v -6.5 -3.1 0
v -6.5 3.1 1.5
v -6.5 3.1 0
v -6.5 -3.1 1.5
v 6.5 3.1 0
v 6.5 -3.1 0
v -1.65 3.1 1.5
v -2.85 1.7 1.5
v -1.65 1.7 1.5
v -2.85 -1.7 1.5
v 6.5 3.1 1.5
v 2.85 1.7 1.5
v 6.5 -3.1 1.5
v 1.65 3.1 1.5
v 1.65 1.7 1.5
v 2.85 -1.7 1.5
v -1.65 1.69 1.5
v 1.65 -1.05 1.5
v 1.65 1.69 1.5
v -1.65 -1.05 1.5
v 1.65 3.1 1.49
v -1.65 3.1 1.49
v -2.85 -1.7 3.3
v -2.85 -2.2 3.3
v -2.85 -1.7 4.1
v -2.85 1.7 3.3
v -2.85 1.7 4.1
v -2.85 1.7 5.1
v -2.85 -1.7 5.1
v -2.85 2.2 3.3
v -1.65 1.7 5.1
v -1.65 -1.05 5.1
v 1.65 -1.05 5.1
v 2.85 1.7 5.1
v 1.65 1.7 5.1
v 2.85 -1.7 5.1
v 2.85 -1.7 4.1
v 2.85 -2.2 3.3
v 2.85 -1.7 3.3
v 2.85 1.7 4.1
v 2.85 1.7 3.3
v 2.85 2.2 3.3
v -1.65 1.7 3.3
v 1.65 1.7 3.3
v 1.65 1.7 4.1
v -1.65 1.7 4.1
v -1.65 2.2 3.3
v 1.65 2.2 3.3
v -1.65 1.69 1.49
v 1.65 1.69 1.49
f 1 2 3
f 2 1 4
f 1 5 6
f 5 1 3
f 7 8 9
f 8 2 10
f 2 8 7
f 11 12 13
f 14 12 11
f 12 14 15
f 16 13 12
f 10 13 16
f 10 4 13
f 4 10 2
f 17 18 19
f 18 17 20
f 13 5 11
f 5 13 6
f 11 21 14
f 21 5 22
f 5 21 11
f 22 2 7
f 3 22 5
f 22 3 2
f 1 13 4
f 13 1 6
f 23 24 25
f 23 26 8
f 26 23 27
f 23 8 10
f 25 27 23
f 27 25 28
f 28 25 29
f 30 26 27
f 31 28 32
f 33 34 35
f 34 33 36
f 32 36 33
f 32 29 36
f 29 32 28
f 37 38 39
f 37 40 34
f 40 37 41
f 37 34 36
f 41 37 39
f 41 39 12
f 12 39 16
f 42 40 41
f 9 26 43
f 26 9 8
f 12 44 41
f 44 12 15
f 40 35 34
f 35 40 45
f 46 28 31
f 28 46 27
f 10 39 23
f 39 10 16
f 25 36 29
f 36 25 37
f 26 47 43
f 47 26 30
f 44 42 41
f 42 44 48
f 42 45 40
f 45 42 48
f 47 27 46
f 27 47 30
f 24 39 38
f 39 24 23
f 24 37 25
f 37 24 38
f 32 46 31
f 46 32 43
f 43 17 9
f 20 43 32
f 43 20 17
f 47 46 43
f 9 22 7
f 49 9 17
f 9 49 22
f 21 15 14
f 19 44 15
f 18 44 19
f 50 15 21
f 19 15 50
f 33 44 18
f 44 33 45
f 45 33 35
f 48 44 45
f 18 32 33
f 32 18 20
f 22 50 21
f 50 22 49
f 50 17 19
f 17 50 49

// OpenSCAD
// ============================================================
// ПОЛЗУНОК ПЕРЕКЛЮЧАТЕЛЯ
// ============================================================

wall_t   = 1.7;
hole_l   = 8.0;
hole_w   = 3.7;
switch_h = 2.0;

pin_w = 1.8;
pin_l = 3.3;

tolerance = 0.15;


// ============================================================
// РАЗМЕРЫ
// ============================================================

leg_l = hole_l - switch_h - tolerance * 2;
leg_w = hole_w - tolerance * 2;
leg_h = wall_t + 0.9;

cap_l = hole_l + 5.0;
cap_w = hole_w + 2.5;
cap_h = 1.5;

tooth_out = 0.5;
tooth_h   = 0.8;


// ============================================================
translate([0, 0, leg_h + cap_h])
    rotate([0, 180, 0])
        main_slider();


// ============================================================

module main_slider()
{
    difference()
    {
        union()
        {
            // ------------------------------------------------
            // ШЛЯПКА
            // ------------------------------------------------

            translate([
                -cap_l/2,
                -cap_w/2,
                leg_h
            ])
                cube([
                    cap_l,
                    cap_w,
                    cap_h
                ]);


            // ------------------------------------------------
            // ОСНОВНАЯ НОЖКА
            // ------------------------------------------------

            translate([
                -leg_l/2,
                -leg_w/2,
                -1
            ])
                cube([
                    leg_l,
                    leg_w,
                    leg_h + 1
                ]);


            // ------------------------------------------------
            // НАРУЖНЫЕ ЗУБЬЯ СО СКОСОМ
            // ------------------------------------------------

            translate([
                -leg_l/2,
                leg_w/2,
                0
            ])
                translate([leg_l/2, tooth_out/2, tooth_h/2])
                    rotate([0, 180, 0])
                        translate([-leg_l/2, -tooth_out/2, -tooth_h/2])
                            snap_tooth(leg_l);


            translate([
                -leg_l/2,
                -leg_w/2,
                0
            ])
                mirror([0,1,0])
                translate([leg_l/2, tooth_out/2, tooth_h/2])
                    rotate([0, 180, 0])
                        translate([-leg_l/2, -tooth_out/2, -tooth_h/2])
                    snap_tooth(leg_l);
        }


        // ====================================================
        // ПОСАДОЧНОЕ МЕСТО ПОД ДВИЖОК
        // ====================================================

        translate([
            -pin_l/2,
            -(pin_w + 2*tolerance)/2,
            -2
        ])
            cube([
                pin_l,
                pin_w + 10*tolerance,
                leg_h + 2
            ]);


        // ====================================================
        // БОКОВОЙ ВХОД
        // ====================================================

        translate([
            -pin_l/2,
            leg_w/2 - 0.01,
            -0.01
        ])
            cube([
                pin_l,
                leg_w/2 + tooth_out + 0.02,
                leg_h + 0.02
            ]);
    }
}


// ============================================================
// ЗУБ ЗАЩЁЛКИ
//
// Внутренняя сторона вертикальная.
// Наружная сторона имеет скос.
//
//              ножка
//                │
//                │
//                ├──────┐
//                │      ╲
//                │       ╲
//                │        └──
//                │
// ============================================================

module snap_tooth(l)
{
    polyhedron(
        points = [
            // Внутренняя сторона
            [0, 0,         0],
            [l, 0,         0],

            // Наружная нижняя точка
            [0, tooth_out, 0],
            [l, tooth_out, 0],

            // Верхняя точка
            [0, 0,         tooth_h],
            [l, 0,         tooth_h]
        ],

        faces = [
            // Нижняя грань
            [0, 1, 3, 2],

            // Внутренняя вертикальная грань
            [0, 4, 5, 1],

            // Наружный скос
            [2, 3, 5, 4],

            // Торец
            [0, 2, 4],

            // Торец
            [1, 5, 3]
        ]
    );
}
